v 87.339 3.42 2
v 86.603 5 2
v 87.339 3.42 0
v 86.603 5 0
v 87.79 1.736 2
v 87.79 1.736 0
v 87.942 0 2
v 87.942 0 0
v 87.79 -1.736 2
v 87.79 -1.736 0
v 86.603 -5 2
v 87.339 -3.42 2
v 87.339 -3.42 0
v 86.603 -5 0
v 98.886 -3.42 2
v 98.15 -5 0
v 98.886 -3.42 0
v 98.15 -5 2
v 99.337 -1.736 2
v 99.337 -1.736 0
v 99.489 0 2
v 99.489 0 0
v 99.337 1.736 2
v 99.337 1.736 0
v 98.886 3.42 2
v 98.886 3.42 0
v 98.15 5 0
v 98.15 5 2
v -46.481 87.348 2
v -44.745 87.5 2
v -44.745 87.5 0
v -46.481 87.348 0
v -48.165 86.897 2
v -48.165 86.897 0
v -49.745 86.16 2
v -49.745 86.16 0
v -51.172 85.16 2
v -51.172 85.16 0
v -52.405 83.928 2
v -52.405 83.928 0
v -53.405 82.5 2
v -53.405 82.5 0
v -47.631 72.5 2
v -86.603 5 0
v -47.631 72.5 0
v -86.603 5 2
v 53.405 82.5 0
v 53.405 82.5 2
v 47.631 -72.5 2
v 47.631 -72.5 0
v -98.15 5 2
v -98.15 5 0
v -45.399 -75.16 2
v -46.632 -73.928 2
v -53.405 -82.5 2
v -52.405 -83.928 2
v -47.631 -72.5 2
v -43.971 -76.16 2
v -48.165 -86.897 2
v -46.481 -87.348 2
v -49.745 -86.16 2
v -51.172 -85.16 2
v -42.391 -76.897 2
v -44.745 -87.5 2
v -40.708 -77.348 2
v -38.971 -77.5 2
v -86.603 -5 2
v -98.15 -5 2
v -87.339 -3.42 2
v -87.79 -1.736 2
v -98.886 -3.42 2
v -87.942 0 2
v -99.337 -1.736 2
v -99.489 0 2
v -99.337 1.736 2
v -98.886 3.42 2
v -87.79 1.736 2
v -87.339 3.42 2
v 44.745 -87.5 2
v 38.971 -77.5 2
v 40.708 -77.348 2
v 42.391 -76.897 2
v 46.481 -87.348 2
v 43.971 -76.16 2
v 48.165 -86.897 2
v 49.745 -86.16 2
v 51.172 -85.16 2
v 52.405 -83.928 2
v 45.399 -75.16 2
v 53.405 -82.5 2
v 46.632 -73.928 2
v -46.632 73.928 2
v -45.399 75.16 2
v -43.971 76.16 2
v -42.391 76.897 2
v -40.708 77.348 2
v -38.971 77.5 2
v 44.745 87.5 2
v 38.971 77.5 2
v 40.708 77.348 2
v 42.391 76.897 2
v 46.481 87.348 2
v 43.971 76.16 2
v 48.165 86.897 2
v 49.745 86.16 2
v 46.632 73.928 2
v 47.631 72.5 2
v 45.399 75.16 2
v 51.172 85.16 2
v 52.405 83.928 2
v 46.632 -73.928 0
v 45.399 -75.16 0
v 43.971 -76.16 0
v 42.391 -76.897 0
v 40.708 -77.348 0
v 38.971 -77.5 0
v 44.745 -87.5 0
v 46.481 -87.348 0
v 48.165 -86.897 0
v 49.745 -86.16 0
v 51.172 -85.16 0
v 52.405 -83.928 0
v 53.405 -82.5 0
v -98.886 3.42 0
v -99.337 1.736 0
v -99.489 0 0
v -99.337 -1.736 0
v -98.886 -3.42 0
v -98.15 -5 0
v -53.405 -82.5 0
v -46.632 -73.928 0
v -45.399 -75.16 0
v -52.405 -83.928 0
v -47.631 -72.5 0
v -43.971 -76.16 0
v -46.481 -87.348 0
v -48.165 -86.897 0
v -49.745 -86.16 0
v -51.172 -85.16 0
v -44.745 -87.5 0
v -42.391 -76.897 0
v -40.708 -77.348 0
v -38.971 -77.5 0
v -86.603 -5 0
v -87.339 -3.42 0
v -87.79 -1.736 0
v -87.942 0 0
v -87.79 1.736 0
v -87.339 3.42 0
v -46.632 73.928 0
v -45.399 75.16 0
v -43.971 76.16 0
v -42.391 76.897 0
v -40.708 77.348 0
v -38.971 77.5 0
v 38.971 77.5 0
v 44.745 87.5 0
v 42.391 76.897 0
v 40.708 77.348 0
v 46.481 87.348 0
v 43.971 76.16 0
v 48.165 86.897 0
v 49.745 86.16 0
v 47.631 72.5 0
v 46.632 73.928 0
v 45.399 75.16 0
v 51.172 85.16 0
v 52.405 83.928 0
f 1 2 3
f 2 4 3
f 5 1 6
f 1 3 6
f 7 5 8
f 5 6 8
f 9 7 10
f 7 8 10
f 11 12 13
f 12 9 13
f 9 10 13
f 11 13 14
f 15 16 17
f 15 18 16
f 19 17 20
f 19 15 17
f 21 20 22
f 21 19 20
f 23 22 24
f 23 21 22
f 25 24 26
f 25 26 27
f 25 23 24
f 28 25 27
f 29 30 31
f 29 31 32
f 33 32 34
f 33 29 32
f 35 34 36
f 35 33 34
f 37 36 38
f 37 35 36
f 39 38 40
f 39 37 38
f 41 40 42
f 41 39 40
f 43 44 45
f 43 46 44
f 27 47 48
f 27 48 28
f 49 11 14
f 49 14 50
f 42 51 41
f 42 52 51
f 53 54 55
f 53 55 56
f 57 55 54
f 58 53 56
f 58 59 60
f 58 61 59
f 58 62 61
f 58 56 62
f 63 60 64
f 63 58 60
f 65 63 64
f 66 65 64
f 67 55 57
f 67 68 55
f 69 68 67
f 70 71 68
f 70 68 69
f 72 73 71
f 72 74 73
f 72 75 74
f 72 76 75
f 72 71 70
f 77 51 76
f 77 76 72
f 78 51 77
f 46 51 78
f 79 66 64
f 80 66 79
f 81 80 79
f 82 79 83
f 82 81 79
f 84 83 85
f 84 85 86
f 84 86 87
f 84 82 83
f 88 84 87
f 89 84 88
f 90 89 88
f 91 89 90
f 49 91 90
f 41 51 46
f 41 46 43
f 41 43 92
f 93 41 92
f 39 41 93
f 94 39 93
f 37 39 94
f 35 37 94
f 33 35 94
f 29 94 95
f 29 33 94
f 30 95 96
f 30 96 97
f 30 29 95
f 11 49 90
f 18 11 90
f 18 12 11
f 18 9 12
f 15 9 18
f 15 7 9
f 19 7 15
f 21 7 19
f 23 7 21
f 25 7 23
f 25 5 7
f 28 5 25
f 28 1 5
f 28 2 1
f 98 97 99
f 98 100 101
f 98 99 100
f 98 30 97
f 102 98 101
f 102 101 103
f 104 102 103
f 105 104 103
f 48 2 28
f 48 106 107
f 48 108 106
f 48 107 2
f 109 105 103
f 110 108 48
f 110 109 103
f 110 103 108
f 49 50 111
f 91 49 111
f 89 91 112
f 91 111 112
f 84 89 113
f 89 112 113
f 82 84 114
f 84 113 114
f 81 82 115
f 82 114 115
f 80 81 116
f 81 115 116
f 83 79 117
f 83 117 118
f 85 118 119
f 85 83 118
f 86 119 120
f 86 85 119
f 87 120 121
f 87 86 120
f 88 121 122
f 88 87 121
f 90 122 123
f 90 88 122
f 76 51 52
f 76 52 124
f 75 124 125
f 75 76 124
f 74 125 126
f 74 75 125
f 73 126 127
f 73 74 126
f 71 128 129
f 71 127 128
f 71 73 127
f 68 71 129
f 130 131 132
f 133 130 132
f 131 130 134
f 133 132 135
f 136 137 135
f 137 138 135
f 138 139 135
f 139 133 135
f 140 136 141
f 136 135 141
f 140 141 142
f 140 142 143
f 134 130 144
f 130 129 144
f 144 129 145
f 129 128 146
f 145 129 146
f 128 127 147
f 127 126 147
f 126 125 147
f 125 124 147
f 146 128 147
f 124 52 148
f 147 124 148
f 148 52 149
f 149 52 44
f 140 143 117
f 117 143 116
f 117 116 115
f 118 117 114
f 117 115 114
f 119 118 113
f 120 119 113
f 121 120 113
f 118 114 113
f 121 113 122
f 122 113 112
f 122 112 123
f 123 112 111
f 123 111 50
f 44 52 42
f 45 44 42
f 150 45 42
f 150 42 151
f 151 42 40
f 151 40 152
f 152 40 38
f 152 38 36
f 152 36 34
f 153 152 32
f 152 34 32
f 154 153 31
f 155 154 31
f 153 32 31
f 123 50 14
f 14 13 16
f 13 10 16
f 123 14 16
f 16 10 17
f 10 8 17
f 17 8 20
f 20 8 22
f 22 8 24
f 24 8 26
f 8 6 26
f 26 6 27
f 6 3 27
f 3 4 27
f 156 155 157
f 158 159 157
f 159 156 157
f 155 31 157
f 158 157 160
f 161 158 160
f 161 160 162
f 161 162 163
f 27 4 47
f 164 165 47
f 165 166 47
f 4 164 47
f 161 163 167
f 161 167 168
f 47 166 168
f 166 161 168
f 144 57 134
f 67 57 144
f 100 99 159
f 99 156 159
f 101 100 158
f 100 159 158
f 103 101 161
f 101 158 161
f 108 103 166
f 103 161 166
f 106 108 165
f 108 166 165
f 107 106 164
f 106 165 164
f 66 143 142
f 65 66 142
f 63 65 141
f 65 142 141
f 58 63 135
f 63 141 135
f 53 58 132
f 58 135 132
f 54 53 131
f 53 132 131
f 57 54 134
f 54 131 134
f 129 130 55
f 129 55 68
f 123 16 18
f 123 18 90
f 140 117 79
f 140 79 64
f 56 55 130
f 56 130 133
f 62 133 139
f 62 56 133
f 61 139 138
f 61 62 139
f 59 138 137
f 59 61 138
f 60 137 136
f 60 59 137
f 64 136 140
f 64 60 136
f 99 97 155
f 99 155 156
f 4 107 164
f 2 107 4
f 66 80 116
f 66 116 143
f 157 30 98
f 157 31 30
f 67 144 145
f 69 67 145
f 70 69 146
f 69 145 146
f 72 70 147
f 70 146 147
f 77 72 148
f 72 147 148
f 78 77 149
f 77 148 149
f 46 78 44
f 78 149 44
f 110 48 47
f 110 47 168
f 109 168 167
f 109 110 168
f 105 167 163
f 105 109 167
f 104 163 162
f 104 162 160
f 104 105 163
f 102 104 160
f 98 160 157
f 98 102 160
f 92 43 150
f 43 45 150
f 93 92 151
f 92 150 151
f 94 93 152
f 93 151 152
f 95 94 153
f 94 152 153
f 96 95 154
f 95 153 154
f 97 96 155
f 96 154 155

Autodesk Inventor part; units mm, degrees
ref_plane "YZ Plane" through (0, 0, 0) normal (1, 0, 0) x (0, 1, 0)
ref_plane "XZ Plane" through (0, 0, 0) normal (0, 1, 0) x (-1, 0, 0)
ref_plane "XY Plane" through (0, 0, 0) normal (0, 0, 1) x (1, 0, 0)
sketch "Sketch1" plane through (0, 0, 0) normal (0, 0, 1) x (1, 0, 0)
  line L0 (50.5181, -87.5) -> (-50.5181, -87.5)
  line L1 (-50.5181, -87.5) -> (-101.0363, 0)
  line L2 (-101.0363, 0) -> (-50.5181, 87.5)
  line L3 (-50.5181, 87.5) -> (50.5181, 87.5)
  line L4 (50.5181, 87.5) -> (101.0363, 0)
  line L5 (101.0363, 0) -> (50.5181, -87.5)
  point P0 (0, 0)
  point P1 (0, 0)
  dimension "d0" = 175
extrude "Extrusion1" add sketch "Sketch1" along normal blind 2
sketch "Sketch7" plane through (0, 0, 2) normal (0, 0, 1) x (1, 0, 0)
  line L0 (-50.5181, -87.5) -> (50.5181, -87.5) projected
  line L1 (50.5181, -87.5) -> (101.0363, 0) projected
  line L2 (101.0363, 0) -> (50.5181, 87.5) projected
  line L3 (50.5181, 87.5) -> (-50.5181, 87.5) projected
  line L4 (-50.5181, 87.5) -> (-101.0363, 0) projected
  line L5 (-101.0363, 0) -> (-50.5181, -87.5) projected
  line L6 (-44.7446, 77.5) -> (44.7446, 77.5)
  line L7 (44.7446, 77.5) -> (89.4893, 0)
  line L8 (89.4893, 0) -> (44.7446, -77.5)
  line L9 (44.7446, -77.5) -> (-44.7446, -77.5)
  line L10 (-44.7446, -77.5) -> (-89.4893, 0)
  line L11 (-89.4893, 0) -> (-44.7446, 77.5)
  dimension "d26" = 10
extrude "Extrusion6" cut sketch "Sketch7" against normal blind 7 contours L6 L7 L8 L9 L10 L11
fillet "Fillet2" radius 10 6 edges at (-89.4893, 0, 1) (-44.7446, -77.5, 1) (44.7446, -77.5, 1) (89.4893, 0, 1) (44.7446, 77.5, 1) (-44.7446, 77.5, 1)
fillet "Fillet3" radius 10 6 edges at (-50.5181, 87.5, 1) (50.5181, 87.5, 1) (101.0363, 0, 1) (50.5181, -87.5, 1) (-50.5181, -87.5, 1) (-101.0363, 0, 1)
properties part number "Cover v1"
